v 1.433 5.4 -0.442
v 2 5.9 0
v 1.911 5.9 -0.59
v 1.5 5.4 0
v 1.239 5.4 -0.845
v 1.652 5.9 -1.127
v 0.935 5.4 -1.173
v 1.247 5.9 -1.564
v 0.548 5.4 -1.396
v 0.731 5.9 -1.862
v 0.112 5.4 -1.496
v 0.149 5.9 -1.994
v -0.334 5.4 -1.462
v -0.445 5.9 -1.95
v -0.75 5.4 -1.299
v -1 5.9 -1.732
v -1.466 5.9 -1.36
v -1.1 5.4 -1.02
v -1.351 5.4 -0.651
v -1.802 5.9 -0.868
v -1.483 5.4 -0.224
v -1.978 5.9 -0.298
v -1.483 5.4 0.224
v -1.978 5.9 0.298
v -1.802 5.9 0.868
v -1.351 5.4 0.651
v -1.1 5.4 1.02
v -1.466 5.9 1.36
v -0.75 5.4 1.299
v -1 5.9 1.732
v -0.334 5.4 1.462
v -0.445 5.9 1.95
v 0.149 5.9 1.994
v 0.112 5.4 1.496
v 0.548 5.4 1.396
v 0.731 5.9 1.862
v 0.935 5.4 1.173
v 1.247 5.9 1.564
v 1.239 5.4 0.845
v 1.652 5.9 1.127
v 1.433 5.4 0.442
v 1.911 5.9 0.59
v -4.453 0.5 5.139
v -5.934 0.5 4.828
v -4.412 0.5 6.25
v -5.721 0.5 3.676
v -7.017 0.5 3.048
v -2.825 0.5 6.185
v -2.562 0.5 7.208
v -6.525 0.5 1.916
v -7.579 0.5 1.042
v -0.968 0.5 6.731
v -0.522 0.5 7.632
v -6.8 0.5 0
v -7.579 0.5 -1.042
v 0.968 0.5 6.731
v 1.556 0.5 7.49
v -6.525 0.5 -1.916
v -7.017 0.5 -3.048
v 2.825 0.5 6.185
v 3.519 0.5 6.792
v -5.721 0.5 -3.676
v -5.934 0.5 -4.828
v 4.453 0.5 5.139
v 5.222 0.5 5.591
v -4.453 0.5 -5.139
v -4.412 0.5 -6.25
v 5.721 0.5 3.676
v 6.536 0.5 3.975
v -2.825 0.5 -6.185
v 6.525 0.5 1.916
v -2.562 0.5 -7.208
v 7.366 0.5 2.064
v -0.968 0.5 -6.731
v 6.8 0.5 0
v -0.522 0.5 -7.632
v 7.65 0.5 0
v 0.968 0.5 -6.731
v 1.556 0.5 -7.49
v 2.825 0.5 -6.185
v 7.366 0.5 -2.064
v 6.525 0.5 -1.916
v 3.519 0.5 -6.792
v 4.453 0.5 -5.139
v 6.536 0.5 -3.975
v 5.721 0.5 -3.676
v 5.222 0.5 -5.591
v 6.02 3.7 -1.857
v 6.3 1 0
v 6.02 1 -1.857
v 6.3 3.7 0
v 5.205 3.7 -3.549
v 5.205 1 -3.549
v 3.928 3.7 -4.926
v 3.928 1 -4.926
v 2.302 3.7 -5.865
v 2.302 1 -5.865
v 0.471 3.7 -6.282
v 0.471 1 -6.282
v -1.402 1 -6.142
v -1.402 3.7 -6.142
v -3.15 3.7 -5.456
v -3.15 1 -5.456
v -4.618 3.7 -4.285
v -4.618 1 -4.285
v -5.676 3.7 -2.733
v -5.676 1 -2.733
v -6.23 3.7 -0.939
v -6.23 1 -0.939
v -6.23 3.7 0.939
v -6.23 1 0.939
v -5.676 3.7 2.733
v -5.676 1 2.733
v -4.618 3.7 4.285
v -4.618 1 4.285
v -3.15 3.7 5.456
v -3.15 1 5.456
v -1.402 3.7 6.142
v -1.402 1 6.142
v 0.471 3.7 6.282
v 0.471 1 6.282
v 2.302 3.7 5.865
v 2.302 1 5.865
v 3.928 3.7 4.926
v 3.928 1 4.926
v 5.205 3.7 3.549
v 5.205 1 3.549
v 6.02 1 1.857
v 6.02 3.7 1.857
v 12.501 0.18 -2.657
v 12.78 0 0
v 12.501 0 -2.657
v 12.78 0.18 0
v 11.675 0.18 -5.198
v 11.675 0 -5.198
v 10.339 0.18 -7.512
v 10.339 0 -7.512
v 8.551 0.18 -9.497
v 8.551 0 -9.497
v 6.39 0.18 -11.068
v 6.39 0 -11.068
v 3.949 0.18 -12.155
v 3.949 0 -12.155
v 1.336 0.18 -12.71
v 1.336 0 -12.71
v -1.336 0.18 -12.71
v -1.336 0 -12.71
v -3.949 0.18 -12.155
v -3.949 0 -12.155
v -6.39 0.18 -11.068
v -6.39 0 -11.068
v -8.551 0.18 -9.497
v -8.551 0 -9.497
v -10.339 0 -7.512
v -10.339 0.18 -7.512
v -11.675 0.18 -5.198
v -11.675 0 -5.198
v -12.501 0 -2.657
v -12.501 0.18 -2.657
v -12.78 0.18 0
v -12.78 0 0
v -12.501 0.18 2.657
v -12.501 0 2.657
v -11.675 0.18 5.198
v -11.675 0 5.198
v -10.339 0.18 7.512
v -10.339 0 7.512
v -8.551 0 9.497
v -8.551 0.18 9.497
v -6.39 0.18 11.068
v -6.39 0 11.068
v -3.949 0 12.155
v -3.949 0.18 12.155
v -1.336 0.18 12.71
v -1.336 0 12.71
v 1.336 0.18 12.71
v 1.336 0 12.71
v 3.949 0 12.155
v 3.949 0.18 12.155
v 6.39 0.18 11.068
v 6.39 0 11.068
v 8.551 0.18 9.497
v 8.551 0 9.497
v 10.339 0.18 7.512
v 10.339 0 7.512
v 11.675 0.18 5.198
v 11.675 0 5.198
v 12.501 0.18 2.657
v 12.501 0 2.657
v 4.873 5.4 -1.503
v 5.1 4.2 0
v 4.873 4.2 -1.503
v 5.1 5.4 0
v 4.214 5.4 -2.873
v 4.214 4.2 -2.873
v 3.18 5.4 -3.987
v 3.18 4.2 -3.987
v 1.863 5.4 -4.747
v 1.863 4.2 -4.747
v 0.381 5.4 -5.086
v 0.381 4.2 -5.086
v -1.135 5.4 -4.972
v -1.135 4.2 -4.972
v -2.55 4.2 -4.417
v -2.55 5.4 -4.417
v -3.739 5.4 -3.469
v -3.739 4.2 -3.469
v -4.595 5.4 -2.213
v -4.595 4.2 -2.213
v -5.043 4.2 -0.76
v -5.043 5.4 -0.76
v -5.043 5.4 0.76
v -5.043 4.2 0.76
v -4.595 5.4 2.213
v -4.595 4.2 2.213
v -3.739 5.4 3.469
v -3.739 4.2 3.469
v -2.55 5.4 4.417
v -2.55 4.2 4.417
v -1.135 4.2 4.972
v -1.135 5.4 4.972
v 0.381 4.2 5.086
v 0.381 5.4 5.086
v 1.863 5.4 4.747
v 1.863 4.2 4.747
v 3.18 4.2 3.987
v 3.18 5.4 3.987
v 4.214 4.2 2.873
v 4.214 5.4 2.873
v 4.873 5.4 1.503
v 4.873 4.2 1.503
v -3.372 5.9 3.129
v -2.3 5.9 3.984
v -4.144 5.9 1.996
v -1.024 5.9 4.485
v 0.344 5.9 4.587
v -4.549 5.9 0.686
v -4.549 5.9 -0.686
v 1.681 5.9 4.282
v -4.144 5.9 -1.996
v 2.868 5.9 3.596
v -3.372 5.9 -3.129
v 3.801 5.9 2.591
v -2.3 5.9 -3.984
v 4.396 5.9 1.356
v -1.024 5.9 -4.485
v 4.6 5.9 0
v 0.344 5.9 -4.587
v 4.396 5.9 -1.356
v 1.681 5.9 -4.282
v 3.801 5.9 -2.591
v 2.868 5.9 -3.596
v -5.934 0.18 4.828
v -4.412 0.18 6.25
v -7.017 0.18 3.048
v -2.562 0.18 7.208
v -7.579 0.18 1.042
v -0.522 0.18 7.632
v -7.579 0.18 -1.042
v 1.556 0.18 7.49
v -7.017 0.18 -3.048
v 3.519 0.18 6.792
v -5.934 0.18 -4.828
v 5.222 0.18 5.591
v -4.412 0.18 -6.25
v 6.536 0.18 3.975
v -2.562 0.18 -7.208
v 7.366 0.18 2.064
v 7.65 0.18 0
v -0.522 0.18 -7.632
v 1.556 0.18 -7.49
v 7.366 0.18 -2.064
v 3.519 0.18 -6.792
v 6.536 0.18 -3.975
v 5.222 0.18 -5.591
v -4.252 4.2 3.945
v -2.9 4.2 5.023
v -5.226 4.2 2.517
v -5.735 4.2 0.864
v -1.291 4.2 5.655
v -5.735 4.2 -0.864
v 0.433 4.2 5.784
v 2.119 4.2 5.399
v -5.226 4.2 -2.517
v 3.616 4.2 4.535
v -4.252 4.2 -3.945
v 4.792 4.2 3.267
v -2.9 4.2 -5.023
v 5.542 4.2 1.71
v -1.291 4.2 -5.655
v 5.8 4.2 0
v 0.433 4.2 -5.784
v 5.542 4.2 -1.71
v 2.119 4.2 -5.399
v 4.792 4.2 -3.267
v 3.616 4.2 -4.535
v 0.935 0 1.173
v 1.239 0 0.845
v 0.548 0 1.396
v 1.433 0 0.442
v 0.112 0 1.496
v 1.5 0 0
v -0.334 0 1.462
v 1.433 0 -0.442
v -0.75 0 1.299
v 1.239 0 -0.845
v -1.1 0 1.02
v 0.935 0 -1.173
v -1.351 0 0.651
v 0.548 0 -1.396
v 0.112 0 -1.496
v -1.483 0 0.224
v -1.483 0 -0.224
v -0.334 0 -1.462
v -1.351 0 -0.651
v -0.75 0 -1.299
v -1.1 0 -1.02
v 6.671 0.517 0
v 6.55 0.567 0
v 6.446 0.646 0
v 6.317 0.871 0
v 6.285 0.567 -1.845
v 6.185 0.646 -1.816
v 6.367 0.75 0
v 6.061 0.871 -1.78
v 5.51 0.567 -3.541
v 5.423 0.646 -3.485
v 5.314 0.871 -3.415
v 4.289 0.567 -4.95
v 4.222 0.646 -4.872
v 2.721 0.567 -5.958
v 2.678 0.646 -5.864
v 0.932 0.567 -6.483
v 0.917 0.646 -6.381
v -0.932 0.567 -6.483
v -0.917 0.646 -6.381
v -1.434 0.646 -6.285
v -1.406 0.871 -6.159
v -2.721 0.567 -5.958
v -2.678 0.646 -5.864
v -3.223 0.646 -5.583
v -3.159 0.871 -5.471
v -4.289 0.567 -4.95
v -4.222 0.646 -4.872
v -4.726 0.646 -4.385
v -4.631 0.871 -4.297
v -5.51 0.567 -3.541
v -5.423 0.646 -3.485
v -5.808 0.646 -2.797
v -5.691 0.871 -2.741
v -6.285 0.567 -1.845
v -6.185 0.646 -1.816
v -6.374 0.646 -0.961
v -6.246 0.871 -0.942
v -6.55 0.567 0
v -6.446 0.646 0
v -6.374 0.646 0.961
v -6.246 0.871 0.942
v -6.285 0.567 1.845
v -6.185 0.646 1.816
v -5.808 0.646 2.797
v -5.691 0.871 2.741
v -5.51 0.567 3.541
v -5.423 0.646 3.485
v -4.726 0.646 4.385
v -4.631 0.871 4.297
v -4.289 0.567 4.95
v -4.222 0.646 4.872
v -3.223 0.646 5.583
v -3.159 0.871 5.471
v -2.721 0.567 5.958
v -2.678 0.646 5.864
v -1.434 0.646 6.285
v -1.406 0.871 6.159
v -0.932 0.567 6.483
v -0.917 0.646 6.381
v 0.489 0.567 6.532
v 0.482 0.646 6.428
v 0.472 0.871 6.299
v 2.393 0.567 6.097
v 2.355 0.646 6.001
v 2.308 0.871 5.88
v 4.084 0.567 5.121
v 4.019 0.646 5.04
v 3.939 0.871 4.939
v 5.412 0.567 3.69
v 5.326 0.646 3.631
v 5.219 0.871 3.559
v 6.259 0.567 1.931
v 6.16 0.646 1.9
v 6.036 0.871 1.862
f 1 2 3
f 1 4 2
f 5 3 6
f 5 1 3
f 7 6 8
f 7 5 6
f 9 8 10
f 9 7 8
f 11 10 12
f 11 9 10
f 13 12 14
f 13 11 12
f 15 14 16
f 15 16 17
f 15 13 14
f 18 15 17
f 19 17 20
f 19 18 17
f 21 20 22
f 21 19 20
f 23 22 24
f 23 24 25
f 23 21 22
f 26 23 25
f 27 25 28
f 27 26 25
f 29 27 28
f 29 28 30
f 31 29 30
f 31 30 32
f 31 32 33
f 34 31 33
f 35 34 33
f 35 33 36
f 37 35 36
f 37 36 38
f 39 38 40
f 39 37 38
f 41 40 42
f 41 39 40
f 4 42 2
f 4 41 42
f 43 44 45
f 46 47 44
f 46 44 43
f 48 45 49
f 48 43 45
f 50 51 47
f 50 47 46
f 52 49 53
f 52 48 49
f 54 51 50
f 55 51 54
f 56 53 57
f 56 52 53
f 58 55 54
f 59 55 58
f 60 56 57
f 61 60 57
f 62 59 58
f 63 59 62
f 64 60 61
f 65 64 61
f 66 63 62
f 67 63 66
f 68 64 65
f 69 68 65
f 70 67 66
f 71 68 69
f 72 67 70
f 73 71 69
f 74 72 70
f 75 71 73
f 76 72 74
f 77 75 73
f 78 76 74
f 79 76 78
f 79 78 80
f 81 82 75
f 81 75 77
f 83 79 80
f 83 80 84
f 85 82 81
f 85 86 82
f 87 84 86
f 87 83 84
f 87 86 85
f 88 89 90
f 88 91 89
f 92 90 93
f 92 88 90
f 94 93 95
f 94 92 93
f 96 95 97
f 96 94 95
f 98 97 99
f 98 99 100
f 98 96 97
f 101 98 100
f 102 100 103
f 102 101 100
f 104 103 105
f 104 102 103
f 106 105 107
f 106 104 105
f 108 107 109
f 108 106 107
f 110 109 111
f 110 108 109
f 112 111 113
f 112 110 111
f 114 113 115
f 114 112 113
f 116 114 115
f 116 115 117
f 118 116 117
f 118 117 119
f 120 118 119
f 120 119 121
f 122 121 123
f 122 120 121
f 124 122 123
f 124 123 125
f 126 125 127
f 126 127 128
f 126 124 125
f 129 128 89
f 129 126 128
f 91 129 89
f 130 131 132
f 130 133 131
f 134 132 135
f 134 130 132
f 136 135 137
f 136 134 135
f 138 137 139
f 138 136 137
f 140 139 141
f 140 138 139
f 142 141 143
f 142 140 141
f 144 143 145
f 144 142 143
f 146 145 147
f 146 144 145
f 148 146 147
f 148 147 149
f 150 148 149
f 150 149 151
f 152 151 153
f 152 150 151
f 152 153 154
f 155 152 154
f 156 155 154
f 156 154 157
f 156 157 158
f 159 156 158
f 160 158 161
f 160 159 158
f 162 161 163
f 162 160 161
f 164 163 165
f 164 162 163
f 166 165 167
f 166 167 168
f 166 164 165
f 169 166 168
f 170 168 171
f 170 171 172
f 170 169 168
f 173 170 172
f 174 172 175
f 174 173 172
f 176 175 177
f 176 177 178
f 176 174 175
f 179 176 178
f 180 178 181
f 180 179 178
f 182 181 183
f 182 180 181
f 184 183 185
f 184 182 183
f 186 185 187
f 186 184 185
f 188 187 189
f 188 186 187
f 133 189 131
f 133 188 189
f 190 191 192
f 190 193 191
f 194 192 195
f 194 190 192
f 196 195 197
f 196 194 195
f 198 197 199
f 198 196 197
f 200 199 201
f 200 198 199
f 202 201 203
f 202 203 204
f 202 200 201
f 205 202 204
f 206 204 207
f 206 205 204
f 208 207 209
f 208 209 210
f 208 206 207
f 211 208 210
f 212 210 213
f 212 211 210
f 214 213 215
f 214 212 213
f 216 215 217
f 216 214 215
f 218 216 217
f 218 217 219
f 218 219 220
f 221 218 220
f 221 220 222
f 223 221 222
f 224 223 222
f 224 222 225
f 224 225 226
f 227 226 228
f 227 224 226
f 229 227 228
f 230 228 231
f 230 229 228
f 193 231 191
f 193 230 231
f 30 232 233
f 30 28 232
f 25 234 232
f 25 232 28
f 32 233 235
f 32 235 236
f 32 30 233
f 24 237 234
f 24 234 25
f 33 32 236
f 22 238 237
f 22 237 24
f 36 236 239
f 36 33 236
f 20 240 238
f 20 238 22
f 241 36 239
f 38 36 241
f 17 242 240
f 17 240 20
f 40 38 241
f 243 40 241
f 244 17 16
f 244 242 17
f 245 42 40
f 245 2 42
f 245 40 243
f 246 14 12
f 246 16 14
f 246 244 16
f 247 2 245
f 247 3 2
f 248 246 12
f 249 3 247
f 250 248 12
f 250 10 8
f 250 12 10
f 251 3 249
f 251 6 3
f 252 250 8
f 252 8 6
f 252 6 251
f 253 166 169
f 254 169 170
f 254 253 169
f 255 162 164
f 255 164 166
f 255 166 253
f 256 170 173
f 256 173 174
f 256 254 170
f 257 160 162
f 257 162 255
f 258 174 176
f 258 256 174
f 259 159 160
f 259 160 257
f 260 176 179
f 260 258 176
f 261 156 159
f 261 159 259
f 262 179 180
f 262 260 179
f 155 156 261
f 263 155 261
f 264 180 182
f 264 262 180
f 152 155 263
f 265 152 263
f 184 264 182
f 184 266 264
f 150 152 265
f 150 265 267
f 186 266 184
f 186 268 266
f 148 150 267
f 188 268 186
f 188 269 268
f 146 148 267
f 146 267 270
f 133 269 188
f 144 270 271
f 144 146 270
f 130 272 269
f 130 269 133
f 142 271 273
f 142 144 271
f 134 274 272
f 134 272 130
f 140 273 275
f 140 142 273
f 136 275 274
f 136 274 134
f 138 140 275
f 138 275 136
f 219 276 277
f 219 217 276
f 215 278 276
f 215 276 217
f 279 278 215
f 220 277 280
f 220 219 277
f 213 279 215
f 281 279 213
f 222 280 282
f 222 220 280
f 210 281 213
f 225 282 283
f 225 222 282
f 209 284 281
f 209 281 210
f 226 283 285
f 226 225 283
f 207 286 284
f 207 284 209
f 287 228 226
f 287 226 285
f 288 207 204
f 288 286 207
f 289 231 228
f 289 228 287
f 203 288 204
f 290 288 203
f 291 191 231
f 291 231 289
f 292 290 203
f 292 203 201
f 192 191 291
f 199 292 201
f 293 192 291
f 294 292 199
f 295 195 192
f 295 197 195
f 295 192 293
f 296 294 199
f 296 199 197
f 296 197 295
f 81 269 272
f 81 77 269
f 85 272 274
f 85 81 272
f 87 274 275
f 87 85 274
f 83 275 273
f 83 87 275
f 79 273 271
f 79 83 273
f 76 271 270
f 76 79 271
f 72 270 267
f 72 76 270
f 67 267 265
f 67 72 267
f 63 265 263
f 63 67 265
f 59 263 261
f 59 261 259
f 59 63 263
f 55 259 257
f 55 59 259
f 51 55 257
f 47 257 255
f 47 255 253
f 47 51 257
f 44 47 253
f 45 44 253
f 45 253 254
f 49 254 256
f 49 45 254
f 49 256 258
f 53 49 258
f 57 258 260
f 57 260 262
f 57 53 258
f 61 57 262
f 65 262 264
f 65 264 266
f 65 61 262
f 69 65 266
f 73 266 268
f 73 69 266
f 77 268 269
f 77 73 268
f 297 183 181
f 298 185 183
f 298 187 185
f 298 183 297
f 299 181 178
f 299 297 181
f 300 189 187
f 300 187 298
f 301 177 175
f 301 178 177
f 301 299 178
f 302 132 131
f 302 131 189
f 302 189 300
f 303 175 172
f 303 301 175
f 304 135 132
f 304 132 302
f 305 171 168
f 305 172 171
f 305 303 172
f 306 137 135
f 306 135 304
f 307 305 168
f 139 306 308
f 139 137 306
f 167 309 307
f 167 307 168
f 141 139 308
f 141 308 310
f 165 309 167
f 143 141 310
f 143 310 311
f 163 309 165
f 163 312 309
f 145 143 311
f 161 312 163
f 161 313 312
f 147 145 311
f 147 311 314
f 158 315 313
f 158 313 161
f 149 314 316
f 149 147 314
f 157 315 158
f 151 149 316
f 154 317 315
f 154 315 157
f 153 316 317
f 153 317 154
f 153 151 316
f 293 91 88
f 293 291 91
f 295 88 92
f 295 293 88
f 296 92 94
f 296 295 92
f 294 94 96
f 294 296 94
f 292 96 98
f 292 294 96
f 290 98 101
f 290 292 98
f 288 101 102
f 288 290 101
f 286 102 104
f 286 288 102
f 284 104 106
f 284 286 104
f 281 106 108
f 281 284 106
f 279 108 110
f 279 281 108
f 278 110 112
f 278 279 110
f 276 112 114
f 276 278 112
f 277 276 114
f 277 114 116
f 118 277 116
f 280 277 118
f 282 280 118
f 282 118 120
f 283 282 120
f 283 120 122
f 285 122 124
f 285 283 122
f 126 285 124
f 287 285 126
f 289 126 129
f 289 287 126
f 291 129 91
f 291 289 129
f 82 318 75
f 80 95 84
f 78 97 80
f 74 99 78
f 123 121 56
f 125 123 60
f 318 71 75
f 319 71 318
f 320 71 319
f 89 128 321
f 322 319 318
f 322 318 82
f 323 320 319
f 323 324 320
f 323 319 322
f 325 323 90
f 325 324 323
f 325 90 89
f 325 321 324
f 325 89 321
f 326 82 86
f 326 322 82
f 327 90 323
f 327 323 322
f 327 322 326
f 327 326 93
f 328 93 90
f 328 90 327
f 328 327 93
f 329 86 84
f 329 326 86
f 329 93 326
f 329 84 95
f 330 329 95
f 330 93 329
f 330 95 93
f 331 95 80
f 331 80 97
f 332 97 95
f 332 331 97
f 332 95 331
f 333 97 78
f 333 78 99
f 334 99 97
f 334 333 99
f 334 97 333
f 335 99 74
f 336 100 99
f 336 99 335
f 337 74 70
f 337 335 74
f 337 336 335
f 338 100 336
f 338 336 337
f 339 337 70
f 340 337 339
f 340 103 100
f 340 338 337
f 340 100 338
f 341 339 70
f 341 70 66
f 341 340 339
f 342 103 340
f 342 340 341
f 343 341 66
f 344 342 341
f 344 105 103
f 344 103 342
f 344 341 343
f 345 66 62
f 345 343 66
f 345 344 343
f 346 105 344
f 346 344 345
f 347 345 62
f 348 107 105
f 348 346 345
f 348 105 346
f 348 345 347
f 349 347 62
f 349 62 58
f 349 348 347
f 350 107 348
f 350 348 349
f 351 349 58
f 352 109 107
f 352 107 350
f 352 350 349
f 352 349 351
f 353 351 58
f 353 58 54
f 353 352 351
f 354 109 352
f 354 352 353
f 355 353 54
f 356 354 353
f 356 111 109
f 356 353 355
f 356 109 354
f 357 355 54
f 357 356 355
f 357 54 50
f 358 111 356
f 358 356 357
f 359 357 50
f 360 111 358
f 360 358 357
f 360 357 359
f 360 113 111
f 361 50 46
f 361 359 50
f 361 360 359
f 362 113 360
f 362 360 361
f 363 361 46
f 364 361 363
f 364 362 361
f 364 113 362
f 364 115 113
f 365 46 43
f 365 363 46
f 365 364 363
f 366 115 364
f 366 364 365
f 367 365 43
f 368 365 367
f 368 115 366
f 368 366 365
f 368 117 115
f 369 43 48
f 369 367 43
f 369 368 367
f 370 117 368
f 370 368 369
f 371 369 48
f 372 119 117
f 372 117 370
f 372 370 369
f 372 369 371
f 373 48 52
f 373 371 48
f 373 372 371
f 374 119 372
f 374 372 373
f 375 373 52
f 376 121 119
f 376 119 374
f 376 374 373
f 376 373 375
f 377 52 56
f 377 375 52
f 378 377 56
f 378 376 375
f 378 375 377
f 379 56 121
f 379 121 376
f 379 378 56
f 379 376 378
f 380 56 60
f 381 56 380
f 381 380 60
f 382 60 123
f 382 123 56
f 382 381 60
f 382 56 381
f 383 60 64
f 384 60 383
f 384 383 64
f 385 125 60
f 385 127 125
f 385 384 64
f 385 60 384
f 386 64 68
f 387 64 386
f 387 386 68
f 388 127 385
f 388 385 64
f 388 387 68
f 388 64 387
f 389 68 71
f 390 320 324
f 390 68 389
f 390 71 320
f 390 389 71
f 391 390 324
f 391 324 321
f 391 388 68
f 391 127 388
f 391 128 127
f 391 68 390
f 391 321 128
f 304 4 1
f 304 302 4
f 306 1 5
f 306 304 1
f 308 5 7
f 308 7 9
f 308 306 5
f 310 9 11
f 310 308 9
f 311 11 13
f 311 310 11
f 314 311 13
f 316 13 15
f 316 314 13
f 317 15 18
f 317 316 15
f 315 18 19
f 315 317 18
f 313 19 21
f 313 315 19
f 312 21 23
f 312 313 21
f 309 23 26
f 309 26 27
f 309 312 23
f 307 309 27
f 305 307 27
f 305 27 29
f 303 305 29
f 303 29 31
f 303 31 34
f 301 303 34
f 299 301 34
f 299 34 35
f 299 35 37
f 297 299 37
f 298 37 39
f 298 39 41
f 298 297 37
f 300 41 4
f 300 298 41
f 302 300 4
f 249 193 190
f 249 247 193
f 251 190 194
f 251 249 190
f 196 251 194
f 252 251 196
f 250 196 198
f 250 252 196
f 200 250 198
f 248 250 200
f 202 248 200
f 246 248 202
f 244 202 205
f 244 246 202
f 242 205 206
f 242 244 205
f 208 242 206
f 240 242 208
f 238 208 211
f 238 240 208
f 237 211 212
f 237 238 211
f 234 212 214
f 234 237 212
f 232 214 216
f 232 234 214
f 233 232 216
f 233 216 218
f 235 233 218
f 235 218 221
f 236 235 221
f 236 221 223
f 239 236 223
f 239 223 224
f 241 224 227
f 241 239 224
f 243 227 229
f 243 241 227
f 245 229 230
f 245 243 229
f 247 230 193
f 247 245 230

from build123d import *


with BuildPart() as part:
    # Sketch1 → Revolve1 (revolve)
    with BuildSketch(Plane(origin=(0, 0, 0), x_dir=(0, -1, 0), z_dir=(0, 0, -1))):
        with BuildLine():
            Line((0, 1.5), (0, 12.78))
            Line((0, 12.78), (-0.18, 12.78))
            Line((-0.18, 12.78), (-0.18, 7.65))
            Line((-0.18, 7.65), (-0.5, 7.65))
            Line((-0.5, 7.65), (-0.5, 6.8))
            ThreePointArc((-0.5, 6.8), (-0.646446609, 6.446446609), (-1, 6.3))
            Line((-1, 6.3), (-3.7, 6.3))
            Line((-3.7, 6.3), (-4.2, 5.8))
            Line((-4.2, 5.8), (-4.2, 5.1))
            Line((-4.2, 5.1), (-5.4, 5.1))
            Line((-5.4, 5.1), (-5.9, 4.6))
            Line((-5.9, 4.6), (-5.9, 2))
            Line((-5.9, 2), (-5.4, 1.5))
            Line((-5.4, 1.5), (0, 1.5))
        make_face()
    revolve(axis=Axis((0, 0, 0), (0, 1, 0)))


solid = part.part
